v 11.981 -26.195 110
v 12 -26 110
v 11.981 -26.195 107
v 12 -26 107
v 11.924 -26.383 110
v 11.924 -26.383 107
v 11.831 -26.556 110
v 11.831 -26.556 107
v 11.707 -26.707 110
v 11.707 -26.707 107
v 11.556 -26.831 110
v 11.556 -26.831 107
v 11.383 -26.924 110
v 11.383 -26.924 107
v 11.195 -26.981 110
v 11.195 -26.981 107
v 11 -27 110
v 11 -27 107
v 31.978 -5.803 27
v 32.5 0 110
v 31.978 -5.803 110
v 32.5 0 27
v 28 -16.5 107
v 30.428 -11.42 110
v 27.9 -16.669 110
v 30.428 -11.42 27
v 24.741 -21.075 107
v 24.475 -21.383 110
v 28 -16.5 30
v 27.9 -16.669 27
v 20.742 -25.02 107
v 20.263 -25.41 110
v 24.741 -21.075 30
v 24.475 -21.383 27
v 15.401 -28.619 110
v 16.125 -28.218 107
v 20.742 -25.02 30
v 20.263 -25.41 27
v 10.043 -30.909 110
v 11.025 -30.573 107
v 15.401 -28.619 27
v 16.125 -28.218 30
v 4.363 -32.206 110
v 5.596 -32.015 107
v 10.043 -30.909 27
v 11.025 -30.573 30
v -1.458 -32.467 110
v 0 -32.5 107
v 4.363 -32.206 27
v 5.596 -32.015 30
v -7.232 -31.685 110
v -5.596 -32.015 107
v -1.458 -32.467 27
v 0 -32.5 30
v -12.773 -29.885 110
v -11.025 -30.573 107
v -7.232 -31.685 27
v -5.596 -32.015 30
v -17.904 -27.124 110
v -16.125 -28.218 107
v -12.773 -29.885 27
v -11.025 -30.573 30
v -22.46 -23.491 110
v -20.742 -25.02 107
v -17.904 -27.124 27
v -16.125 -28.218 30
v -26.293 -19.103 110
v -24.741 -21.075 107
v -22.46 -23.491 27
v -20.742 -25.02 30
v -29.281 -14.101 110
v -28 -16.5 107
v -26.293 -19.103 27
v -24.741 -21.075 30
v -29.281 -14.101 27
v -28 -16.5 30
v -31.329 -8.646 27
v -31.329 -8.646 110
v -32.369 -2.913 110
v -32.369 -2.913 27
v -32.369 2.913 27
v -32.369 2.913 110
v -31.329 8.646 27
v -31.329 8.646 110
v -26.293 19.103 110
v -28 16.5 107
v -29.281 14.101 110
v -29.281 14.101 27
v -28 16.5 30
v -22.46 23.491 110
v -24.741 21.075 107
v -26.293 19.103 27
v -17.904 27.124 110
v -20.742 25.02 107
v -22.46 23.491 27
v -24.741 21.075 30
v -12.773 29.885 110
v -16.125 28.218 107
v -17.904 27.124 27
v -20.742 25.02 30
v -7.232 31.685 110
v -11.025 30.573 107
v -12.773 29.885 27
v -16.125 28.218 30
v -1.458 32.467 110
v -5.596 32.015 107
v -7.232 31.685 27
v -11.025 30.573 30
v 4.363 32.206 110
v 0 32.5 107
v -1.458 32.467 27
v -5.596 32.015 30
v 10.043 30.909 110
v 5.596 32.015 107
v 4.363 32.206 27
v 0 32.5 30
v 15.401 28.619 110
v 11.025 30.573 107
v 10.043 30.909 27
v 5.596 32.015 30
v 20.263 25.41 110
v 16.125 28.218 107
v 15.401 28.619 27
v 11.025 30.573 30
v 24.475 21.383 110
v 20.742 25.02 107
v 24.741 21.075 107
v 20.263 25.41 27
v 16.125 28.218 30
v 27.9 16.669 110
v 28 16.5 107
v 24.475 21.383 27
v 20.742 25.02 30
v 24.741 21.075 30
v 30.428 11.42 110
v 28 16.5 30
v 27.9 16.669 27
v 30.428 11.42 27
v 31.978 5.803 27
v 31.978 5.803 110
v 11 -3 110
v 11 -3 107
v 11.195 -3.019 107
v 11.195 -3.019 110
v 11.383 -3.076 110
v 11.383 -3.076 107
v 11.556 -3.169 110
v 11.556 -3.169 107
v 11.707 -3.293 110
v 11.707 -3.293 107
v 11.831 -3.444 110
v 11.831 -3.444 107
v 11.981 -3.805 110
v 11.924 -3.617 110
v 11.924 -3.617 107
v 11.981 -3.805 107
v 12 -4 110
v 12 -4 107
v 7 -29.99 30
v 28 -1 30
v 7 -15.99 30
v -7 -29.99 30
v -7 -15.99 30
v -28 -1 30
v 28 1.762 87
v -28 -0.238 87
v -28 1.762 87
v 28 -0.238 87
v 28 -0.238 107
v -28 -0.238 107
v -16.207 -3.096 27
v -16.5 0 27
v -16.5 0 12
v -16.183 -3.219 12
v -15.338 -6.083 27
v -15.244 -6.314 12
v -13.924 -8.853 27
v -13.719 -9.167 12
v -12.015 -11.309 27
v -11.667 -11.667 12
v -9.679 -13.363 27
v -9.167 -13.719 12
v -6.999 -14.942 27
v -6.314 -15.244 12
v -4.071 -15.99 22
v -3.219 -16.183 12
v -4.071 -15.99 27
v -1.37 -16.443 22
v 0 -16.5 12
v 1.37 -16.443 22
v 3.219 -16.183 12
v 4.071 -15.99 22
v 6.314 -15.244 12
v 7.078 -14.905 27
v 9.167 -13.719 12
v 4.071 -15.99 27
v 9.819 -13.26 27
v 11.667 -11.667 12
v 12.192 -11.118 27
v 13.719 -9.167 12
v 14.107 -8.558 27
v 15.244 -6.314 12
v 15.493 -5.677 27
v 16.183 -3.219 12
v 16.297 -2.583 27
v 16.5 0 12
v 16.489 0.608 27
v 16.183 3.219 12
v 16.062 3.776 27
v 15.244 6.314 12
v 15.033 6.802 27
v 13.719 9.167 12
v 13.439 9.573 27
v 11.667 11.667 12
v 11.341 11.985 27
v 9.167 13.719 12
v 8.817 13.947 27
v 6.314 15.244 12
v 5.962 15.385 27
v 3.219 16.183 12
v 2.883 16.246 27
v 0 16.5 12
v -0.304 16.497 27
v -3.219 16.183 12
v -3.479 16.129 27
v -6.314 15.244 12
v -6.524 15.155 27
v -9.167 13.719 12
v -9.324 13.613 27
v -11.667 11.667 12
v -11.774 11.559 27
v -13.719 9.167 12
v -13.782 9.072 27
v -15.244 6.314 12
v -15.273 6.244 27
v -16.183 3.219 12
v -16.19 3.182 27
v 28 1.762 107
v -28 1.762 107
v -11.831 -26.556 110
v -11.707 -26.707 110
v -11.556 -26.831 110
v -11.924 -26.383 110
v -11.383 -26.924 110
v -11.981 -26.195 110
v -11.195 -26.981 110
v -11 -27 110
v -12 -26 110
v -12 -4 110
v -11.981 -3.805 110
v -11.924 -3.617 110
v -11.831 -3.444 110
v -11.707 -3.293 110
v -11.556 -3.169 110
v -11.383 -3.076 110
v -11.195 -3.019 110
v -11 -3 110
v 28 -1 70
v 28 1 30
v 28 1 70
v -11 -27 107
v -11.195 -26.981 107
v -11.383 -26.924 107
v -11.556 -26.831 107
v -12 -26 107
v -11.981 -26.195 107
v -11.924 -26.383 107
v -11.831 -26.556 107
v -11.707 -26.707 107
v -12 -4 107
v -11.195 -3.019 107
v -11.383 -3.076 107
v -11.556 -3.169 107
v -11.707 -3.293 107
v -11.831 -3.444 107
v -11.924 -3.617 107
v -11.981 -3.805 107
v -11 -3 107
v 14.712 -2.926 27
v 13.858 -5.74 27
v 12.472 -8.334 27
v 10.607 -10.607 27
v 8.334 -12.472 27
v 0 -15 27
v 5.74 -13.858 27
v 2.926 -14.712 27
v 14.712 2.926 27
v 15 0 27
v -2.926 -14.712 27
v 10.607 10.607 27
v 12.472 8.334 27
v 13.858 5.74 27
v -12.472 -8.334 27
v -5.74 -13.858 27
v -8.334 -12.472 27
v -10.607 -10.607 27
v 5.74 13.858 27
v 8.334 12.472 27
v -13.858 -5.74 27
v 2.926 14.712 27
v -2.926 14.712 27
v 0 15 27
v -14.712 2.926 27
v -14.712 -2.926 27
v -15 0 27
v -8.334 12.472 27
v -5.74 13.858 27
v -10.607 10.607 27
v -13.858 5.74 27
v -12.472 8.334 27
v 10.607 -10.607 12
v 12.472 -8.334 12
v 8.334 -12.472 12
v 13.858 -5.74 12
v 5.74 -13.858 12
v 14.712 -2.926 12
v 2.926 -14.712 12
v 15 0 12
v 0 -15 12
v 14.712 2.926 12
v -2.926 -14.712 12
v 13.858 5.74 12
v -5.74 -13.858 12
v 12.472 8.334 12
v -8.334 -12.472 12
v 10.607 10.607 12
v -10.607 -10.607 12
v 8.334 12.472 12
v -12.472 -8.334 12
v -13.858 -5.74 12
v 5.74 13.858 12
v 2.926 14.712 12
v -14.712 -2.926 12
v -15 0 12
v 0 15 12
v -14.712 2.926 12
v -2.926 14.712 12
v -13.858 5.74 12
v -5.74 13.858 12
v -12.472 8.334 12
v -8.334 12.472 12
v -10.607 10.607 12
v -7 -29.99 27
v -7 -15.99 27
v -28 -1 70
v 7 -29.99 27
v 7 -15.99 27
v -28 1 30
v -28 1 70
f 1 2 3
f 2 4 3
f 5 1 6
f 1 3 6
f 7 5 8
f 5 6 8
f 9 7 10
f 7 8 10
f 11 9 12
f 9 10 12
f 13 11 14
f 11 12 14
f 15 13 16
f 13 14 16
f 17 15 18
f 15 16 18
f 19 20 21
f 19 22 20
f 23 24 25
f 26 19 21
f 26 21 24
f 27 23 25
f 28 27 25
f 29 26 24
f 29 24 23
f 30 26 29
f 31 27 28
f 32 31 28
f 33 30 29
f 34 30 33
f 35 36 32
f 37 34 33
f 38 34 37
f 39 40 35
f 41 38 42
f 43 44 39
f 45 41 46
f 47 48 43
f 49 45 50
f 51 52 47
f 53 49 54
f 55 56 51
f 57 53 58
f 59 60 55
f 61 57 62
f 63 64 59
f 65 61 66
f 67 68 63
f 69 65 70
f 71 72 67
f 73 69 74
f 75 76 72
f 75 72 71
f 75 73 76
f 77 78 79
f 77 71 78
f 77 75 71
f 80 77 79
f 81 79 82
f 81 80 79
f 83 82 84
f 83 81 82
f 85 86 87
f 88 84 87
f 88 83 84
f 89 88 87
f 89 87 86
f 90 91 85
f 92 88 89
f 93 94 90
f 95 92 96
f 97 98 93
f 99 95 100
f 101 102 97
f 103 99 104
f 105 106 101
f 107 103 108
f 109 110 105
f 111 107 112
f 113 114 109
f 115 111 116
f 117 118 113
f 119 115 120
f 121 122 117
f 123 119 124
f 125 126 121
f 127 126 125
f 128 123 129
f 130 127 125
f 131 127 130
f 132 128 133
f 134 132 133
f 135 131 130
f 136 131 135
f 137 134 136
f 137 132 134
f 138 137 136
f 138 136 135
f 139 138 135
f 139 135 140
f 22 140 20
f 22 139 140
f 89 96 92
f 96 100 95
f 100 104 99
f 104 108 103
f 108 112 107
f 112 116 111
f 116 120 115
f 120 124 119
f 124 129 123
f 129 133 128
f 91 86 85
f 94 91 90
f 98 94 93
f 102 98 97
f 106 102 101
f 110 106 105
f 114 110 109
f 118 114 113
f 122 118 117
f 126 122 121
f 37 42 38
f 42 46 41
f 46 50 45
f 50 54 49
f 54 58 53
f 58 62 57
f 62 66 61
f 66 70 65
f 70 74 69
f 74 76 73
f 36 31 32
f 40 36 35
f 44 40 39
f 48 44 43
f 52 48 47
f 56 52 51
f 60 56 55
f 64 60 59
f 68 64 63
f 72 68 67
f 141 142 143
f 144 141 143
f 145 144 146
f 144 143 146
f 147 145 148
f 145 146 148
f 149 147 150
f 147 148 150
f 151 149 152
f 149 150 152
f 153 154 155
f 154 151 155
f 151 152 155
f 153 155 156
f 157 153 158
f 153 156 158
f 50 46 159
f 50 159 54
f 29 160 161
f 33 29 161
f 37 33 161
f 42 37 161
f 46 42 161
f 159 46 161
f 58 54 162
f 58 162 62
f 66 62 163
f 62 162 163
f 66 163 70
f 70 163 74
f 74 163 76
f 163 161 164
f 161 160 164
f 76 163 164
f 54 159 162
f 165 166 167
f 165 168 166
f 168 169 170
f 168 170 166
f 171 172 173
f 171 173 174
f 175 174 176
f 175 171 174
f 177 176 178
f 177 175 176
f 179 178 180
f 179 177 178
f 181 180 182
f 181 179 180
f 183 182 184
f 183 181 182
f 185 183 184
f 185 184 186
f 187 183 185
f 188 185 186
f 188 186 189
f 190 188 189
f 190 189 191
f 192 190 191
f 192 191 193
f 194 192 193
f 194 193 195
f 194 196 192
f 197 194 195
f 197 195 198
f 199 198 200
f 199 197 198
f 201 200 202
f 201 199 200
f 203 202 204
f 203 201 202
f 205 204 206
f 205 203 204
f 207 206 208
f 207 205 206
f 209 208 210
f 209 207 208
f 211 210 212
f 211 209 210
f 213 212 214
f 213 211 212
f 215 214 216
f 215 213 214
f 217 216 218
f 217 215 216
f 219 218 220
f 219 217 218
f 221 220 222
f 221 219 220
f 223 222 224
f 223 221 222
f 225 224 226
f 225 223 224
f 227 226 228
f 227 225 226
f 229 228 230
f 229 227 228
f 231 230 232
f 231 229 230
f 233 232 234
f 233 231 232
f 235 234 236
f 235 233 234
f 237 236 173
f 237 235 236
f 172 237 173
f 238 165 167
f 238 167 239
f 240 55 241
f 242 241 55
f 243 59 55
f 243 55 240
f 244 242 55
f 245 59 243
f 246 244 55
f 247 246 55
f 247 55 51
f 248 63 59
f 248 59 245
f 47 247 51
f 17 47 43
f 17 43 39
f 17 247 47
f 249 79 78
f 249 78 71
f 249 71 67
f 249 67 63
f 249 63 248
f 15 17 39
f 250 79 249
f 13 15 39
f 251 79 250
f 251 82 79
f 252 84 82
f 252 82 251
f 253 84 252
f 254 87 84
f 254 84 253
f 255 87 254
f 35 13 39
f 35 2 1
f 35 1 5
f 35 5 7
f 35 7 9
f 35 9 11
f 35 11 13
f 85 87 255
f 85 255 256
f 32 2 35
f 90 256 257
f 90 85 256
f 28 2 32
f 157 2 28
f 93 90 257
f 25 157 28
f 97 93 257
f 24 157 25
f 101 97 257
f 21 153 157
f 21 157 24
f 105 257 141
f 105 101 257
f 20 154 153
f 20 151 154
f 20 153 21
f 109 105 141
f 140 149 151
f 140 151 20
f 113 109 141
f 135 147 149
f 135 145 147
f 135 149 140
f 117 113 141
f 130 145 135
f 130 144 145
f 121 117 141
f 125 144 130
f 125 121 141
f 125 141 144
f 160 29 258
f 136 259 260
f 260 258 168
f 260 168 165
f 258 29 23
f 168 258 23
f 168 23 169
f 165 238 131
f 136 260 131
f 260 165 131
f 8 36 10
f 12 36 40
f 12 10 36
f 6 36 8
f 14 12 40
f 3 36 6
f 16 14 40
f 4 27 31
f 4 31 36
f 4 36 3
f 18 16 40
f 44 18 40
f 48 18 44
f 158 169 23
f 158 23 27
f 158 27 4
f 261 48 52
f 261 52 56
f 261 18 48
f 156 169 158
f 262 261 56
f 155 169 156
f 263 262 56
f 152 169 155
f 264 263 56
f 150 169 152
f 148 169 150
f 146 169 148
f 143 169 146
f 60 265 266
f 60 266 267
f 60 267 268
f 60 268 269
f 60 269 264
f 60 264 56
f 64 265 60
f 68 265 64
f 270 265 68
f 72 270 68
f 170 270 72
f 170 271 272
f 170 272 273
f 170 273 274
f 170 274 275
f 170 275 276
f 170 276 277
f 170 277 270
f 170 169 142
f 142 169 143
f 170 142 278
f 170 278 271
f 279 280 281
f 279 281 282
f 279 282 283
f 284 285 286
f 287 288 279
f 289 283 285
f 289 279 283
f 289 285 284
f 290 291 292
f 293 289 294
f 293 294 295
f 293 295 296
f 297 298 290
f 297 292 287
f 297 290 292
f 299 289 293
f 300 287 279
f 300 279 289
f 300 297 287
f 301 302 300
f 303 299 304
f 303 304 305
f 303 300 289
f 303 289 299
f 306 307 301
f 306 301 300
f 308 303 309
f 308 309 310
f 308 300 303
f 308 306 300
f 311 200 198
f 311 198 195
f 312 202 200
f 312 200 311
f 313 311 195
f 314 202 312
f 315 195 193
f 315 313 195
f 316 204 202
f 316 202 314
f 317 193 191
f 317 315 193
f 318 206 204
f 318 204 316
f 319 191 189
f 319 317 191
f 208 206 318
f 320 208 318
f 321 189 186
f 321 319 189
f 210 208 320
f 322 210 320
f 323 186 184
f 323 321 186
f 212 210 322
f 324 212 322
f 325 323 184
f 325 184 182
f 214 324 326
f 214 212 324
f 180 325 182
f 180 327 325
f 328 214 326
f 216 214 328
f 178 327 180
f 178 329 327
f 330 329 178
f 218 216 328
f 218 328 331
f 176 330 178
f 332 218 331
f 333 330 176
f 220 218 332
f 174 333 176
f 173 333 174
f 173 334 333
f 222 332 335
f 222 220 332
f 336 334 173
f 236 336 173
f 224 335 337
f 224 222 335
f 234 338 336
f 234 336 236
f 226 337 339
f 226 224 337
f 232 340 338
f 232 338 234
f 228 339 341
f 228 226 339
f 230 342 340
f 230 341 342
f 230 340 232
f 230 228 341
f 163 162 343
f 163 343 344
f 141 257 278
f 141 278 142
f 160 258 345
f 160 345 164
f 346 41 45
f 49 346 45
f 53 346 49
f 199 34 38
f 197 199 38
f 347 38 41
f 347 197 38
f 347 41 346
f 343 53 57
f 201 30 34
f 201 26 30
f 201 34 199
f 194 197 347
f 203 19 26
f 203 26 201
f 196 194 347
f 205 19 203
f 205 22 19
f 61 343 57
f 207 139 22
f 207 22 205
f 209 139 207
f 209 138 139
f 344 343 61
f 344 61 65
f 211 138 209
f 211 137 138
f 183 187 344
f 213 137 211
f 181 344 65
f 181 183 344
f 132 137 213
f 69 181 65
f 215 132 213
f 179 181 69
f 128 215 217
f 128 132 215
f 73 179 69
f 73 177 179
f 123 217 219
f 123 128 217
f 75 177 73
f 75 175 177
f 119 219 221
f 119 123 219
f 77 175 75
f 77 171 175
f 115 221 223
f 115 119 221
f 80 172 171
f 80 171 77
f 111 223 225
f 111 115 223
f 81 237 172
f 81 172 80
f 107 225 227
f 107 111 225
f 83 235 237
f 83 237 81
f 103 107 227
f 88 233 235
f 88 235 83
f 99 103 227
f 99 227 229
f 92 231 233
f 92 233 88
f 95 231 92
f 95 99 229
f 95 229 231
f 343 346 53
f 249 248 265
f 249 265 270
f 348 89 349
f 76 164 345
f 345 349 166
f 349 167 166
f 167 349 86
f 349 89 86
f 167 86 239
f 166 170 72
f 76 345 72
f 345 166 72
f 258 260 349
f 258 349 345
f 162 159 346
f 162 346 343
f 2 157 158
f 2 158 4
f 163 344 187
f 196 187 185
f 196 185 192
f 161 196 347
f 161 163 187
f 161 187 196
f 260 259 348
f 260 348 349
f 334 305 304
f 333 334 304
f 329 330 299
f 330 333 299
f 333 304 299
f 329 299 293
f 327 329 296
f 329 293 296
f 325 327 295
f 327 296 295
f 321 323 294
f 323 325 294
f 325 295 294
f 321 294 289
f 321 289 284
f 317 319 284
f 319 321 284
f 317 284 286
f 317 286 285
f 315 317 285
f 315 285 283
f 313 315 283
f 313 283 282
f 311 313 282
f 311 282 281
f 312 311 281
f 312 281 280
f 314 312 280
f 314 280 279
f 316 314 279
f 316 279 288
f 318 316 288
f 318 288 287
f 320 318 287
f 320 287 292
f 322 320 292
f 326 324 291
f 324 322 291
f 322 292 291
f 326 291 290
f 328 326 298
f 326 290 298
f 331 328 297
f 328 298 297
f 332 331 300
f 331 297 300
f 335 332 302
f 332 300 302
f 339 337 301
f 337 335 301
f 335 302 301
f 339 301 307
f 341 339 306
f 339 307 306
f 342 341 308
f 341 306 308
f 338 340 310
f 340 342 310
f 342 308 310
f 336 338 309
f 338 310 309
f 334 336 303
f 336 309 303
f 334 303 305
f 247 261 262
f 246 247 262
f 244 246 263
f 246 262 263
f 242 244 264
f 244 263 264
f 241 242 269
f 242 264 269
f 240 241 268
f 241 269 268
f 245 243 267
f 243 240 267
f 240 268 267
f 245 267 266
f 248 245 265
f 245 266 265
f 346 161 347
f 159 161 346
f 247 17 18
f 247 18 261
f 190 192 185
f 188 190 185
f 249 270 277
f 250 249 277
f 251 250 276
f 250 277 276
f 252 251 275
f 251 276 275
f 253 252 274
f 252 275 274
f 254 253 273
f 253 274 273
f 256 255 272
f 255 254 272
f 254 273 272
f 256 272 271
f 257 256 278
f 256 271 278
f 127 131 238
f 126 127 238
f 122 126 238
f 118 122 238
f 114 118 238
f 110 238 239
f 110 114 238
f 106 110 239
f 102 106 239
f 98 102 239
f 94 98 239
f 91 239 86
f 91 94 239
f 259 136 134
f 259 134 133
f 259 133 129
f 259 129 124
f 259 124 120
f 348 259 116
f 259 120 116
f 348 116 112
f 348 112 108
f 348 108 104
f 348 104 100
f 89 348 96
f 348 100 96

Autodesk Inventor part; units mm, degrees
ref_plane "YZ Plane" through (0, 0, 0) normal (1, 0, 0) x (0, 1, 0)
ref_plane "XZ Plane" through (0, 0, 0) normal (0, 1, 0) x (-1, 0, 0)
ref_plane "XY Plane" through (0, 0, 0) normal (0, 0, 1) x (1, 0, 0)
sketch "Szkic1" plane through (0, 0, 0) normal (0, 0, 1) x (1, 0, 0)
  circle A0 centre (0, 0) radius 32.5
  dimension "d0" = 65
extrude "Wyciągnięcie proste1" add sketch "Szkic1" along normal blind 110
ref_plane "Płaszczyzna konstrukcyjna5" through (0, 0, 55) normal (0, 0, -1) x (-1, 0, 0)
sketch "Szkic3" plane through (0, 0, 55) normal (0, 0, -1) x (-1, 0, 0)
  line L0 (0, 0) -> (28, 0)
  line L1 (28, 0) -> (28, 16.5)
  circle A0 centre (0, 0) radius 32.5 projected
  line L2 (28, 0) -> (28, -35.6443)
  line L3 (28, -35.6443) -> (-28, -35.6443)
  line L4 (-28, -35.6443) -> (-28, 35.8328)
  line L5 (-28, 35.8328) -> (28, 35.8328)
  line L6 (28, 35.8328) -> (28, 0)
  dimension "d3" = 28
  dimension "d4" = 56
  dimension "d5" = 56
extrude "Wyciągnięcie proste2" cut sketch "Szkic3" along normal blind 25 and the other way blind 52 contours L2 A0 L4 L1 | A0 L4 L5 L6 | L2 L3 L4 A0
sketch "Szkic5" plane through (0, 0, 0) normal (0, 0, -1) x (-1, 0, 0)
  circle A0 centre (0, 0) radius 32.5
extrude "Wyciągnięcie proste3" cut sketch "Szkic5" against normal blind 27
sketch "Szkic6" plane through (0, 0, 27) normal (0, 0, -1) x (-1, 0, 0)
  circle A0 centre (0, 0) radius 15
  circle A1 centre (0, 0) radius 16.5
  dimension "d12" = 30
  dimension "d13" = 33
extrude "Wyciągnięcie proste4" add sketch "Szkic6" along normal blind 15
sketch "Szkic7" plane through (0, 0, 27) normal (0, 0, -1) x (-1, 0, 0)
  line L0 (7, -15.9899) -> (-7, -15.9899)
  line L1 (-7, -15.9899) -> (-7, -29.9899)
  line L2 (-7, -29.9899) -> (7, -29.9899)
  line L3 (7, -29.9899) -> (7, -15.9899)
  line L4 (7, -15.9899) -> (-7, -29.9899) construction
  line L5 (-7, -15.9899) -> (7, -29.9899) construction
  point P0 (0, 0)
  point P1 (0, -22.9899)
  dimension "d16" = 14
  dimension "d17" = 14
extrude "Wyciągnięcie proste5" cut sketch "Szkic7" along normal blind 5 and the other way blind 7.5
sketch "Szkic8" plane through (28, -16.5, 107) normal (-1, 0, 0) x (0, 0, 1)
  line L0 (-77, 0) -> (-77, 33) projected
  line L1 (-77, 16.5) -> (-37, 16.5)
  line L2 (0, 0) -> (0, 33) projected
  line L3 (-37, 16.5) -> (-37, 17.5)
  line L4 (-37, 17.5) -> (-37, 15.5)
  line L5 (-37, 15.5) -> (-77, 15.5)
  line L6 (-77, 15.5) -> (-77, 18.2624)
  line L7 (-77, 15.5) -> (-77, 17.5)
  line L8 (-77, 33) -> (-77, 0) projected
  line L9 (-77, 17.5) -> (-37, 17.5)
  line L10 (-20, 18.2624) -> (0, 18.2624)
  line L11 (0, 18.2624) -> (0, 16.2624)
  line L12 (0, 16.2624) -> (-20, 16.2624)
  line L13 (-20, 16.2624) -> (-20, 18.2624)
  point P0 (-107, 16.5)
  dimension "d22" = 40
  dimension "d23" = 1
  dimension "d24" = 2
  dimension "d25" = 2
  dimension "d28" = 2
  dimension "d29" = 20
extrude "Wyciągnięcie proste6" add sketch "Szkic8" along normal blind 56
sketch "Szkic9" plane through (0, 0, 110) normal (0, 0, 1) x (1, 0, 0)
  line L0 (12, -27) -> (-12, -27)
  line L1 (-12, -27) -> (-12, -3)
  line L2 (-12, -3) -> (12, -3)
  line L3 (12, -3) -> (12, -27)
  line L4 (12, -27) -> (-12, -3) construction
  line L5 (-12, -27) -> (12, -3) construction
  point P0 (0, 0)
  point P1 (0, -15)
  dimension "d30" = 24
  dimension "d31" = 24
extrude "Wyciągnięcie proste7" cut sketch "Szkic9" against normal blind 56
fillet "Zaokrąglenie1" radius 1 4 edges at (12, -27, 108.5) (-12, -27, 108.5) (12, -3, 108.5) (-12, -3, 108.5)
sketch "Szkic13" plane through (28, -1, 30) normal (0, -1, 0) x (1, 0, 0)
  point P0 (-28, -30)
properties part number "Korpus"
